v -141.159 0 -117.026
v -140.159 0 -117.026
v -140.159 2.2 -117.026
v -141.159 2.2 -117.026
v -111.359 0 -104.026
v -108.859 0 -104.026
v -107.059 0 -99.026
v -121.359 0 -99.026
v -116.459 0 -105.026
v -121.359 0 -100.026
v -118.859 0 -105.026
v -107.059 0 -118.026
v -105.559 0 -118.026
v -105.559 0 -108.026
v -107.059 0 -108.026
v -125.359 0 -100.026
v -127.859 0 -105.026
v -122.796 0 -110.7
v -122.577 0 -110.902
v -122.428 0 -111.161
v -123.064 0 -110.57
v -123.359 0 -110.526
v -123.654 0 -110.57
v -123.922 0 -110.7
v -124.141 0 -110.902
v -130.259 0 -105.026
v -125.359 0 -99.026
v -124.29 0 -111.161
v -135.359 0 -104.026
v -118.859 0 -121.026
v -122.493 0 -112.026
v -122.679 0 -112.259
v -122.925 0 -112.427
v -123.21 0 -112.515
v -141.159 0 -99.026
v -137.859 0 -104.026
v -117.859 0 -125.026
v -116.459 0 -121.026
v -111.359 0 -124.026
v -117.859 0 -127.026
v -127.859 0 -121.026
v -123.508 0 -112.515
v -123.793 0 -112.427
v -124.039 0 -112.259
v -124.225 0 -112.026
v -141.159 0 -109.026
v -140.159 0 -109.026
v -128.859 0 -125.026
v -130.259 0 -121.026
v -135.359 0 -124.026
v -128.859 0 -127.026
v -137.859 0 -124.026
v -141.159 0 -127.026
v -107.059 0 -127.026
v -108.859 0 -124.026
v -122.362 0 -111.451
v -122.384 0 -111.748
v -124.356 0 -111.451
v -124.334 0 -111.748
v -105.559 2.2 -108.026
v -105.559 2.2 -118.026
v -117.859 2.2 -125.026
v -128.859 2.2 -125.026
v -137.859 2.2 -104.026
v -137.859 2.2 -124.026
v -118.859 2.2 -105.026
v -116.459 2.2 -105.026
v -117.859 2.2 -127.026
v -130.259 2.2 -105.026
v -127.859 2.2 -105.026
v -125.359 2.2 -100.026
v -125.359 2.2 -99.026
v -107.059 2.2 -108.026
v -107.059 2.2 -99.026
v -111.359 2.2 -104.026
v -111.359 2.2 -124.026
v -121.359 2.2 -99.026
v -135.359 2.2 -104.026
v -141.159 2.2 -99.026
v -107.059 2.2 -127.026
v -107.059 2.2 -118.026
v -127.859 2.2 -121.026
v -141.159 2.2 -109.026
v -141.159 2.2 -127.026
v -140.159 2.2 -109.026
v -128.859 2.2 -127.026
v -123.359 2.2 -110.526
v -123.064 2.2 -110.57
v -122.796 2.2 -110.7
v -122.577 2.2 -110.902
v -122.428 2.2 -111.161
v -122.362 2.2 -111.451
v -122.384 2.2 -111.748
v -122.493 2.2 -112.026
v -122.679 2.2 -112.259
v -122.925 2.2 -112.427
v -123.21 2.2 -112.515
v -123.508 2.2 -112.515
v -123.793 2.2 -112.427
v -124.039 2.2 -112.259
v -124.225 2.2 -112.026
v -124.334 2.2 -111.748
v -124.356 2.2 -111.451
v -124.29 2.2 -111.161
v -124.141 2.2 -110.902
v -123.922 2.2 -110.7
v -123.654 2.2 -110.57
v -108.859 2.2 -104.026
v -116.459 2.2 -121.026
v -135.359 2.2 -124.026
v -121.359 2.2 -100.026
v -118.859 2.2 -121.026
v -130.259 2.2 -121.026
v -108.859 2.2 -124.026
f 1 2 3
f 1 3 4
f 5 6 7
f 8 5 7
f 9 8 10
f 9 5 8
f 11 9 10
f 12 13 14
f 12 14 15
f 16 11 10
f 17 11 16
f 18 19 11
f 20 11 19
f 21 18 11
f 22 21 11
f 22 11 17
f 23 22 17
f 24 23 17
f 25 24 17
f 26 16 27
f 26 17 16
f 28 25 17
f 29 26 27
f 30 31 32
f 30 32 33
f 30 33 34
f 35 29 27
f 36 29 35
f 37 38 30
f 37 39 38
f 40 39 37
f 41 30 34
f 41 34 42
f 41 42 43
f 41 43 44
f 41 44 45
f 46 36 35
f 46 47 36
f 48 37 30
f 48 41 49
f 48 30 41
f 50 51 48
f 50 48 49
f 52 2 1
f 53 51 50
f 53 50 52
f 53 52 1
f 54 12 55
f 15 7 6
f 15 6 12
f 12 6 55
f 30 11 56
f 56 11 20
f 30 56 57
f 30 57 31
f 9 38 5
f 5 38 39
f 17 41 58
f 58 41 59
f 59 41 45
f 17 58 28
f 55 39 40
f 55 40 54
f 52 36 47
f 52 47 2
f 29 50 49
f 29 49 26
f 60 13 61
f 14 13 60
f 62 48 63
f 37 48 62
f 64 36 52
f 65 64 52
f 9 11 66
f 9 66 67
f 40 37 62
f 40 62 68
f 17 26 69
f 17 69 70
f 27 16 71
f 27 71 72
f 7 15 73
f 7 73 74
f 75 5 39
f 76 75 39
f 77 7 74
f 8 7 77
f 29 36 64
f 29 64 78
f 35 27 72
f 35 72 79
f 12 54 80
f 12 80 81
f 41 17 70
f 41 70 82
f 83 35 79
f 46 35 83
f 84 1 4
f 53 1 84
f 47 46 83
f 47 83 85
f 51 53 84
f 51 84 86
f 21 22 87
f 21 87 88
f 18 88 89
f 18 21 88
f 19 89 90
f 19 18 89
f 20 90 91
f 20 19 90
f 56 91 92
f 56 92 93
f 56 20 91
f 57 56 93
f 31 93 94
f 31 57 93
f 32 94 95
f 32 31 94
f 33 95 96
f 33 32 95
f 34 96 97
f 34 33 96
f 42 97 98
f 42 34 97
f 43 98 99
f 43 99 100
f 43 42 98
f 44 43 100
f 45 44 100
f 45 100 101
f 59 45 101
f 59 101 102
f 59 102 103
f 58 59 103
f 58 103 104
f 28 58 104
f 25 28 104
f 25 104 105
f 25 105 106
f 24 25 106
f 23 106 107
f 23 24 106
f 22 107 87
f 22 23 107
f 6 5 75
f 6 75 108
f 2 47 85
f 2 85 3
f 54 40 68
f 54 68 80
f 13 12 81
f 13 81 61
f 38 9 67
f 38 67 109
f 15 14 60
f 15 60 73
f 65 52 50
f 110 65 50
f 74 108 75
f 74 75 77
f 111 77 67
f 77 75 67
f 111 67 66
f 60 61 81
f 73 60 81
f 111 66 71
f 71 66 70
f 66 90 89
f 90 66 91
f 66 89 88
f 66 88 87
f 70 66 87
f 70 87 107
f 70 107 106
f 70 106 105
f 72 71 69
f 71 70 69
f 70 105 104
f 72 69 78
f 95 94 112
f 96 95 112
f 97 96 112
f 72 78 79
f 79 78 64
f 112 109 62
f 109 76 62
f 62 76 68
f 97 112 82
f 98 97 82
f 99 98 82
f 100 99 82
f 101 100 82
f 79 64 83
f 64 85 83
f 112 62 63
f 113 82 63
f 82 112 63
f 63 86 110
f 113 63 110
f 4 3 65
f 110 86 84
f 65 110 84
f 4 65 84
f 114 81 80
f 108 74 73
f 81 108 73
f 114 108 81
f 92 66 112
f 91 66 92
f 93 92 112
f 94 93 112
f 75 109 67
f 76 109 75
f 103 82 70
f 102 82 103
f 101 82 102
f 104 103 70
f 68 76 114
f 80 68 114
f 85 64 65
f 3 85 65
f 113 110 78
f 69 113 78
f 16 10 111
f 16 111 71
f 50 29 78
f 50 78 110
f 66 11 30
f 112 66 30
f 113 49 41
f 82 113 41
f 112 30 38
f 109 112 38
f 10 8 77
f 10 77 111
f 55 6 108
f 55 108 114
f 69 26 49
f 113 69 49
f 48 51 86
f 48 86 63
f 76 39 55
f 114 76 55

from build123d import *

# Parameters (mm, degrees)
SKETCH1_R           = 1
SKETCH1_W           = 2.5
SKETCH1_H           = 20
SKETCH1_W_2         = 2.4
SKETCH1_H_2         = 16
BOSS_EXTRUDE1_DEPTH = 2.2


with BuildPart() as part:
    # Sketch1 → Boss-Extrude1 (new body)
    with BuildSketch(Plane(origin=(0, 0, 0), x_dir=(1, 0, 0), z_dir=(0, 1, 0))):
        Polygon((-117.859054558, 127.025957199), (-107.059054558, 127.025957199), (-107.059054558, 118.025957199), (-105.559054558, 118.025957199), (-105.559054558, 108.025957199), (-107.059054558, 108.025957199), (-107.059054558, 99.025957199), (-121.359054558, 99.025957199), (-121.359054558, 100.025957199), (-125.359054558, 100.025957199), (-125.359054558, 99.025957199), (-141.159054558, 99.025957199), (-141.159054558, 109.025957199), (-140.159054558, 109.025957199), (-140.159054558, 117.025957199), (-141.159054558, 117.025957199), (-141.159054558, 127.025957199), (-128.859054558, 127.025957199), (-128.859054558, 125.025957199), (-117.859054558, 125.025957199), align=None)
        with Locations(Location((-123.359054558, 111.525957199, 0), (0, 0, 270))):
            Circle(SKETCH1_R, mode=Mode.SUBTRACT)
        with Locations((-110.109054558, 114.025957199)):
            Rectangle(SKETCH1_W, SKETCH1_H, mode=Mode.SUBTRACT)
        with Locations((-136.609054558, 114.025957199)):
            Rectangle(SKETCH1_W, SKETCH1_H, mode=Mode.SUBTRACT)
        with Locations((-129.059054558, 113.025957199)):
            Rectangle(SKETCH1_W_2, SKETCH1_H_2, mode=Mode.SUBTRACT)
        with Locations((-117.659054558, 113.025957199)):
            Rectangle(SKETCH1_W_2, SKETCH1_H_2, mode=Mode.SUBTRACT)
    extrude(amount=BOSS_EXTRUDE1_DEPTH)


solid = part.part
